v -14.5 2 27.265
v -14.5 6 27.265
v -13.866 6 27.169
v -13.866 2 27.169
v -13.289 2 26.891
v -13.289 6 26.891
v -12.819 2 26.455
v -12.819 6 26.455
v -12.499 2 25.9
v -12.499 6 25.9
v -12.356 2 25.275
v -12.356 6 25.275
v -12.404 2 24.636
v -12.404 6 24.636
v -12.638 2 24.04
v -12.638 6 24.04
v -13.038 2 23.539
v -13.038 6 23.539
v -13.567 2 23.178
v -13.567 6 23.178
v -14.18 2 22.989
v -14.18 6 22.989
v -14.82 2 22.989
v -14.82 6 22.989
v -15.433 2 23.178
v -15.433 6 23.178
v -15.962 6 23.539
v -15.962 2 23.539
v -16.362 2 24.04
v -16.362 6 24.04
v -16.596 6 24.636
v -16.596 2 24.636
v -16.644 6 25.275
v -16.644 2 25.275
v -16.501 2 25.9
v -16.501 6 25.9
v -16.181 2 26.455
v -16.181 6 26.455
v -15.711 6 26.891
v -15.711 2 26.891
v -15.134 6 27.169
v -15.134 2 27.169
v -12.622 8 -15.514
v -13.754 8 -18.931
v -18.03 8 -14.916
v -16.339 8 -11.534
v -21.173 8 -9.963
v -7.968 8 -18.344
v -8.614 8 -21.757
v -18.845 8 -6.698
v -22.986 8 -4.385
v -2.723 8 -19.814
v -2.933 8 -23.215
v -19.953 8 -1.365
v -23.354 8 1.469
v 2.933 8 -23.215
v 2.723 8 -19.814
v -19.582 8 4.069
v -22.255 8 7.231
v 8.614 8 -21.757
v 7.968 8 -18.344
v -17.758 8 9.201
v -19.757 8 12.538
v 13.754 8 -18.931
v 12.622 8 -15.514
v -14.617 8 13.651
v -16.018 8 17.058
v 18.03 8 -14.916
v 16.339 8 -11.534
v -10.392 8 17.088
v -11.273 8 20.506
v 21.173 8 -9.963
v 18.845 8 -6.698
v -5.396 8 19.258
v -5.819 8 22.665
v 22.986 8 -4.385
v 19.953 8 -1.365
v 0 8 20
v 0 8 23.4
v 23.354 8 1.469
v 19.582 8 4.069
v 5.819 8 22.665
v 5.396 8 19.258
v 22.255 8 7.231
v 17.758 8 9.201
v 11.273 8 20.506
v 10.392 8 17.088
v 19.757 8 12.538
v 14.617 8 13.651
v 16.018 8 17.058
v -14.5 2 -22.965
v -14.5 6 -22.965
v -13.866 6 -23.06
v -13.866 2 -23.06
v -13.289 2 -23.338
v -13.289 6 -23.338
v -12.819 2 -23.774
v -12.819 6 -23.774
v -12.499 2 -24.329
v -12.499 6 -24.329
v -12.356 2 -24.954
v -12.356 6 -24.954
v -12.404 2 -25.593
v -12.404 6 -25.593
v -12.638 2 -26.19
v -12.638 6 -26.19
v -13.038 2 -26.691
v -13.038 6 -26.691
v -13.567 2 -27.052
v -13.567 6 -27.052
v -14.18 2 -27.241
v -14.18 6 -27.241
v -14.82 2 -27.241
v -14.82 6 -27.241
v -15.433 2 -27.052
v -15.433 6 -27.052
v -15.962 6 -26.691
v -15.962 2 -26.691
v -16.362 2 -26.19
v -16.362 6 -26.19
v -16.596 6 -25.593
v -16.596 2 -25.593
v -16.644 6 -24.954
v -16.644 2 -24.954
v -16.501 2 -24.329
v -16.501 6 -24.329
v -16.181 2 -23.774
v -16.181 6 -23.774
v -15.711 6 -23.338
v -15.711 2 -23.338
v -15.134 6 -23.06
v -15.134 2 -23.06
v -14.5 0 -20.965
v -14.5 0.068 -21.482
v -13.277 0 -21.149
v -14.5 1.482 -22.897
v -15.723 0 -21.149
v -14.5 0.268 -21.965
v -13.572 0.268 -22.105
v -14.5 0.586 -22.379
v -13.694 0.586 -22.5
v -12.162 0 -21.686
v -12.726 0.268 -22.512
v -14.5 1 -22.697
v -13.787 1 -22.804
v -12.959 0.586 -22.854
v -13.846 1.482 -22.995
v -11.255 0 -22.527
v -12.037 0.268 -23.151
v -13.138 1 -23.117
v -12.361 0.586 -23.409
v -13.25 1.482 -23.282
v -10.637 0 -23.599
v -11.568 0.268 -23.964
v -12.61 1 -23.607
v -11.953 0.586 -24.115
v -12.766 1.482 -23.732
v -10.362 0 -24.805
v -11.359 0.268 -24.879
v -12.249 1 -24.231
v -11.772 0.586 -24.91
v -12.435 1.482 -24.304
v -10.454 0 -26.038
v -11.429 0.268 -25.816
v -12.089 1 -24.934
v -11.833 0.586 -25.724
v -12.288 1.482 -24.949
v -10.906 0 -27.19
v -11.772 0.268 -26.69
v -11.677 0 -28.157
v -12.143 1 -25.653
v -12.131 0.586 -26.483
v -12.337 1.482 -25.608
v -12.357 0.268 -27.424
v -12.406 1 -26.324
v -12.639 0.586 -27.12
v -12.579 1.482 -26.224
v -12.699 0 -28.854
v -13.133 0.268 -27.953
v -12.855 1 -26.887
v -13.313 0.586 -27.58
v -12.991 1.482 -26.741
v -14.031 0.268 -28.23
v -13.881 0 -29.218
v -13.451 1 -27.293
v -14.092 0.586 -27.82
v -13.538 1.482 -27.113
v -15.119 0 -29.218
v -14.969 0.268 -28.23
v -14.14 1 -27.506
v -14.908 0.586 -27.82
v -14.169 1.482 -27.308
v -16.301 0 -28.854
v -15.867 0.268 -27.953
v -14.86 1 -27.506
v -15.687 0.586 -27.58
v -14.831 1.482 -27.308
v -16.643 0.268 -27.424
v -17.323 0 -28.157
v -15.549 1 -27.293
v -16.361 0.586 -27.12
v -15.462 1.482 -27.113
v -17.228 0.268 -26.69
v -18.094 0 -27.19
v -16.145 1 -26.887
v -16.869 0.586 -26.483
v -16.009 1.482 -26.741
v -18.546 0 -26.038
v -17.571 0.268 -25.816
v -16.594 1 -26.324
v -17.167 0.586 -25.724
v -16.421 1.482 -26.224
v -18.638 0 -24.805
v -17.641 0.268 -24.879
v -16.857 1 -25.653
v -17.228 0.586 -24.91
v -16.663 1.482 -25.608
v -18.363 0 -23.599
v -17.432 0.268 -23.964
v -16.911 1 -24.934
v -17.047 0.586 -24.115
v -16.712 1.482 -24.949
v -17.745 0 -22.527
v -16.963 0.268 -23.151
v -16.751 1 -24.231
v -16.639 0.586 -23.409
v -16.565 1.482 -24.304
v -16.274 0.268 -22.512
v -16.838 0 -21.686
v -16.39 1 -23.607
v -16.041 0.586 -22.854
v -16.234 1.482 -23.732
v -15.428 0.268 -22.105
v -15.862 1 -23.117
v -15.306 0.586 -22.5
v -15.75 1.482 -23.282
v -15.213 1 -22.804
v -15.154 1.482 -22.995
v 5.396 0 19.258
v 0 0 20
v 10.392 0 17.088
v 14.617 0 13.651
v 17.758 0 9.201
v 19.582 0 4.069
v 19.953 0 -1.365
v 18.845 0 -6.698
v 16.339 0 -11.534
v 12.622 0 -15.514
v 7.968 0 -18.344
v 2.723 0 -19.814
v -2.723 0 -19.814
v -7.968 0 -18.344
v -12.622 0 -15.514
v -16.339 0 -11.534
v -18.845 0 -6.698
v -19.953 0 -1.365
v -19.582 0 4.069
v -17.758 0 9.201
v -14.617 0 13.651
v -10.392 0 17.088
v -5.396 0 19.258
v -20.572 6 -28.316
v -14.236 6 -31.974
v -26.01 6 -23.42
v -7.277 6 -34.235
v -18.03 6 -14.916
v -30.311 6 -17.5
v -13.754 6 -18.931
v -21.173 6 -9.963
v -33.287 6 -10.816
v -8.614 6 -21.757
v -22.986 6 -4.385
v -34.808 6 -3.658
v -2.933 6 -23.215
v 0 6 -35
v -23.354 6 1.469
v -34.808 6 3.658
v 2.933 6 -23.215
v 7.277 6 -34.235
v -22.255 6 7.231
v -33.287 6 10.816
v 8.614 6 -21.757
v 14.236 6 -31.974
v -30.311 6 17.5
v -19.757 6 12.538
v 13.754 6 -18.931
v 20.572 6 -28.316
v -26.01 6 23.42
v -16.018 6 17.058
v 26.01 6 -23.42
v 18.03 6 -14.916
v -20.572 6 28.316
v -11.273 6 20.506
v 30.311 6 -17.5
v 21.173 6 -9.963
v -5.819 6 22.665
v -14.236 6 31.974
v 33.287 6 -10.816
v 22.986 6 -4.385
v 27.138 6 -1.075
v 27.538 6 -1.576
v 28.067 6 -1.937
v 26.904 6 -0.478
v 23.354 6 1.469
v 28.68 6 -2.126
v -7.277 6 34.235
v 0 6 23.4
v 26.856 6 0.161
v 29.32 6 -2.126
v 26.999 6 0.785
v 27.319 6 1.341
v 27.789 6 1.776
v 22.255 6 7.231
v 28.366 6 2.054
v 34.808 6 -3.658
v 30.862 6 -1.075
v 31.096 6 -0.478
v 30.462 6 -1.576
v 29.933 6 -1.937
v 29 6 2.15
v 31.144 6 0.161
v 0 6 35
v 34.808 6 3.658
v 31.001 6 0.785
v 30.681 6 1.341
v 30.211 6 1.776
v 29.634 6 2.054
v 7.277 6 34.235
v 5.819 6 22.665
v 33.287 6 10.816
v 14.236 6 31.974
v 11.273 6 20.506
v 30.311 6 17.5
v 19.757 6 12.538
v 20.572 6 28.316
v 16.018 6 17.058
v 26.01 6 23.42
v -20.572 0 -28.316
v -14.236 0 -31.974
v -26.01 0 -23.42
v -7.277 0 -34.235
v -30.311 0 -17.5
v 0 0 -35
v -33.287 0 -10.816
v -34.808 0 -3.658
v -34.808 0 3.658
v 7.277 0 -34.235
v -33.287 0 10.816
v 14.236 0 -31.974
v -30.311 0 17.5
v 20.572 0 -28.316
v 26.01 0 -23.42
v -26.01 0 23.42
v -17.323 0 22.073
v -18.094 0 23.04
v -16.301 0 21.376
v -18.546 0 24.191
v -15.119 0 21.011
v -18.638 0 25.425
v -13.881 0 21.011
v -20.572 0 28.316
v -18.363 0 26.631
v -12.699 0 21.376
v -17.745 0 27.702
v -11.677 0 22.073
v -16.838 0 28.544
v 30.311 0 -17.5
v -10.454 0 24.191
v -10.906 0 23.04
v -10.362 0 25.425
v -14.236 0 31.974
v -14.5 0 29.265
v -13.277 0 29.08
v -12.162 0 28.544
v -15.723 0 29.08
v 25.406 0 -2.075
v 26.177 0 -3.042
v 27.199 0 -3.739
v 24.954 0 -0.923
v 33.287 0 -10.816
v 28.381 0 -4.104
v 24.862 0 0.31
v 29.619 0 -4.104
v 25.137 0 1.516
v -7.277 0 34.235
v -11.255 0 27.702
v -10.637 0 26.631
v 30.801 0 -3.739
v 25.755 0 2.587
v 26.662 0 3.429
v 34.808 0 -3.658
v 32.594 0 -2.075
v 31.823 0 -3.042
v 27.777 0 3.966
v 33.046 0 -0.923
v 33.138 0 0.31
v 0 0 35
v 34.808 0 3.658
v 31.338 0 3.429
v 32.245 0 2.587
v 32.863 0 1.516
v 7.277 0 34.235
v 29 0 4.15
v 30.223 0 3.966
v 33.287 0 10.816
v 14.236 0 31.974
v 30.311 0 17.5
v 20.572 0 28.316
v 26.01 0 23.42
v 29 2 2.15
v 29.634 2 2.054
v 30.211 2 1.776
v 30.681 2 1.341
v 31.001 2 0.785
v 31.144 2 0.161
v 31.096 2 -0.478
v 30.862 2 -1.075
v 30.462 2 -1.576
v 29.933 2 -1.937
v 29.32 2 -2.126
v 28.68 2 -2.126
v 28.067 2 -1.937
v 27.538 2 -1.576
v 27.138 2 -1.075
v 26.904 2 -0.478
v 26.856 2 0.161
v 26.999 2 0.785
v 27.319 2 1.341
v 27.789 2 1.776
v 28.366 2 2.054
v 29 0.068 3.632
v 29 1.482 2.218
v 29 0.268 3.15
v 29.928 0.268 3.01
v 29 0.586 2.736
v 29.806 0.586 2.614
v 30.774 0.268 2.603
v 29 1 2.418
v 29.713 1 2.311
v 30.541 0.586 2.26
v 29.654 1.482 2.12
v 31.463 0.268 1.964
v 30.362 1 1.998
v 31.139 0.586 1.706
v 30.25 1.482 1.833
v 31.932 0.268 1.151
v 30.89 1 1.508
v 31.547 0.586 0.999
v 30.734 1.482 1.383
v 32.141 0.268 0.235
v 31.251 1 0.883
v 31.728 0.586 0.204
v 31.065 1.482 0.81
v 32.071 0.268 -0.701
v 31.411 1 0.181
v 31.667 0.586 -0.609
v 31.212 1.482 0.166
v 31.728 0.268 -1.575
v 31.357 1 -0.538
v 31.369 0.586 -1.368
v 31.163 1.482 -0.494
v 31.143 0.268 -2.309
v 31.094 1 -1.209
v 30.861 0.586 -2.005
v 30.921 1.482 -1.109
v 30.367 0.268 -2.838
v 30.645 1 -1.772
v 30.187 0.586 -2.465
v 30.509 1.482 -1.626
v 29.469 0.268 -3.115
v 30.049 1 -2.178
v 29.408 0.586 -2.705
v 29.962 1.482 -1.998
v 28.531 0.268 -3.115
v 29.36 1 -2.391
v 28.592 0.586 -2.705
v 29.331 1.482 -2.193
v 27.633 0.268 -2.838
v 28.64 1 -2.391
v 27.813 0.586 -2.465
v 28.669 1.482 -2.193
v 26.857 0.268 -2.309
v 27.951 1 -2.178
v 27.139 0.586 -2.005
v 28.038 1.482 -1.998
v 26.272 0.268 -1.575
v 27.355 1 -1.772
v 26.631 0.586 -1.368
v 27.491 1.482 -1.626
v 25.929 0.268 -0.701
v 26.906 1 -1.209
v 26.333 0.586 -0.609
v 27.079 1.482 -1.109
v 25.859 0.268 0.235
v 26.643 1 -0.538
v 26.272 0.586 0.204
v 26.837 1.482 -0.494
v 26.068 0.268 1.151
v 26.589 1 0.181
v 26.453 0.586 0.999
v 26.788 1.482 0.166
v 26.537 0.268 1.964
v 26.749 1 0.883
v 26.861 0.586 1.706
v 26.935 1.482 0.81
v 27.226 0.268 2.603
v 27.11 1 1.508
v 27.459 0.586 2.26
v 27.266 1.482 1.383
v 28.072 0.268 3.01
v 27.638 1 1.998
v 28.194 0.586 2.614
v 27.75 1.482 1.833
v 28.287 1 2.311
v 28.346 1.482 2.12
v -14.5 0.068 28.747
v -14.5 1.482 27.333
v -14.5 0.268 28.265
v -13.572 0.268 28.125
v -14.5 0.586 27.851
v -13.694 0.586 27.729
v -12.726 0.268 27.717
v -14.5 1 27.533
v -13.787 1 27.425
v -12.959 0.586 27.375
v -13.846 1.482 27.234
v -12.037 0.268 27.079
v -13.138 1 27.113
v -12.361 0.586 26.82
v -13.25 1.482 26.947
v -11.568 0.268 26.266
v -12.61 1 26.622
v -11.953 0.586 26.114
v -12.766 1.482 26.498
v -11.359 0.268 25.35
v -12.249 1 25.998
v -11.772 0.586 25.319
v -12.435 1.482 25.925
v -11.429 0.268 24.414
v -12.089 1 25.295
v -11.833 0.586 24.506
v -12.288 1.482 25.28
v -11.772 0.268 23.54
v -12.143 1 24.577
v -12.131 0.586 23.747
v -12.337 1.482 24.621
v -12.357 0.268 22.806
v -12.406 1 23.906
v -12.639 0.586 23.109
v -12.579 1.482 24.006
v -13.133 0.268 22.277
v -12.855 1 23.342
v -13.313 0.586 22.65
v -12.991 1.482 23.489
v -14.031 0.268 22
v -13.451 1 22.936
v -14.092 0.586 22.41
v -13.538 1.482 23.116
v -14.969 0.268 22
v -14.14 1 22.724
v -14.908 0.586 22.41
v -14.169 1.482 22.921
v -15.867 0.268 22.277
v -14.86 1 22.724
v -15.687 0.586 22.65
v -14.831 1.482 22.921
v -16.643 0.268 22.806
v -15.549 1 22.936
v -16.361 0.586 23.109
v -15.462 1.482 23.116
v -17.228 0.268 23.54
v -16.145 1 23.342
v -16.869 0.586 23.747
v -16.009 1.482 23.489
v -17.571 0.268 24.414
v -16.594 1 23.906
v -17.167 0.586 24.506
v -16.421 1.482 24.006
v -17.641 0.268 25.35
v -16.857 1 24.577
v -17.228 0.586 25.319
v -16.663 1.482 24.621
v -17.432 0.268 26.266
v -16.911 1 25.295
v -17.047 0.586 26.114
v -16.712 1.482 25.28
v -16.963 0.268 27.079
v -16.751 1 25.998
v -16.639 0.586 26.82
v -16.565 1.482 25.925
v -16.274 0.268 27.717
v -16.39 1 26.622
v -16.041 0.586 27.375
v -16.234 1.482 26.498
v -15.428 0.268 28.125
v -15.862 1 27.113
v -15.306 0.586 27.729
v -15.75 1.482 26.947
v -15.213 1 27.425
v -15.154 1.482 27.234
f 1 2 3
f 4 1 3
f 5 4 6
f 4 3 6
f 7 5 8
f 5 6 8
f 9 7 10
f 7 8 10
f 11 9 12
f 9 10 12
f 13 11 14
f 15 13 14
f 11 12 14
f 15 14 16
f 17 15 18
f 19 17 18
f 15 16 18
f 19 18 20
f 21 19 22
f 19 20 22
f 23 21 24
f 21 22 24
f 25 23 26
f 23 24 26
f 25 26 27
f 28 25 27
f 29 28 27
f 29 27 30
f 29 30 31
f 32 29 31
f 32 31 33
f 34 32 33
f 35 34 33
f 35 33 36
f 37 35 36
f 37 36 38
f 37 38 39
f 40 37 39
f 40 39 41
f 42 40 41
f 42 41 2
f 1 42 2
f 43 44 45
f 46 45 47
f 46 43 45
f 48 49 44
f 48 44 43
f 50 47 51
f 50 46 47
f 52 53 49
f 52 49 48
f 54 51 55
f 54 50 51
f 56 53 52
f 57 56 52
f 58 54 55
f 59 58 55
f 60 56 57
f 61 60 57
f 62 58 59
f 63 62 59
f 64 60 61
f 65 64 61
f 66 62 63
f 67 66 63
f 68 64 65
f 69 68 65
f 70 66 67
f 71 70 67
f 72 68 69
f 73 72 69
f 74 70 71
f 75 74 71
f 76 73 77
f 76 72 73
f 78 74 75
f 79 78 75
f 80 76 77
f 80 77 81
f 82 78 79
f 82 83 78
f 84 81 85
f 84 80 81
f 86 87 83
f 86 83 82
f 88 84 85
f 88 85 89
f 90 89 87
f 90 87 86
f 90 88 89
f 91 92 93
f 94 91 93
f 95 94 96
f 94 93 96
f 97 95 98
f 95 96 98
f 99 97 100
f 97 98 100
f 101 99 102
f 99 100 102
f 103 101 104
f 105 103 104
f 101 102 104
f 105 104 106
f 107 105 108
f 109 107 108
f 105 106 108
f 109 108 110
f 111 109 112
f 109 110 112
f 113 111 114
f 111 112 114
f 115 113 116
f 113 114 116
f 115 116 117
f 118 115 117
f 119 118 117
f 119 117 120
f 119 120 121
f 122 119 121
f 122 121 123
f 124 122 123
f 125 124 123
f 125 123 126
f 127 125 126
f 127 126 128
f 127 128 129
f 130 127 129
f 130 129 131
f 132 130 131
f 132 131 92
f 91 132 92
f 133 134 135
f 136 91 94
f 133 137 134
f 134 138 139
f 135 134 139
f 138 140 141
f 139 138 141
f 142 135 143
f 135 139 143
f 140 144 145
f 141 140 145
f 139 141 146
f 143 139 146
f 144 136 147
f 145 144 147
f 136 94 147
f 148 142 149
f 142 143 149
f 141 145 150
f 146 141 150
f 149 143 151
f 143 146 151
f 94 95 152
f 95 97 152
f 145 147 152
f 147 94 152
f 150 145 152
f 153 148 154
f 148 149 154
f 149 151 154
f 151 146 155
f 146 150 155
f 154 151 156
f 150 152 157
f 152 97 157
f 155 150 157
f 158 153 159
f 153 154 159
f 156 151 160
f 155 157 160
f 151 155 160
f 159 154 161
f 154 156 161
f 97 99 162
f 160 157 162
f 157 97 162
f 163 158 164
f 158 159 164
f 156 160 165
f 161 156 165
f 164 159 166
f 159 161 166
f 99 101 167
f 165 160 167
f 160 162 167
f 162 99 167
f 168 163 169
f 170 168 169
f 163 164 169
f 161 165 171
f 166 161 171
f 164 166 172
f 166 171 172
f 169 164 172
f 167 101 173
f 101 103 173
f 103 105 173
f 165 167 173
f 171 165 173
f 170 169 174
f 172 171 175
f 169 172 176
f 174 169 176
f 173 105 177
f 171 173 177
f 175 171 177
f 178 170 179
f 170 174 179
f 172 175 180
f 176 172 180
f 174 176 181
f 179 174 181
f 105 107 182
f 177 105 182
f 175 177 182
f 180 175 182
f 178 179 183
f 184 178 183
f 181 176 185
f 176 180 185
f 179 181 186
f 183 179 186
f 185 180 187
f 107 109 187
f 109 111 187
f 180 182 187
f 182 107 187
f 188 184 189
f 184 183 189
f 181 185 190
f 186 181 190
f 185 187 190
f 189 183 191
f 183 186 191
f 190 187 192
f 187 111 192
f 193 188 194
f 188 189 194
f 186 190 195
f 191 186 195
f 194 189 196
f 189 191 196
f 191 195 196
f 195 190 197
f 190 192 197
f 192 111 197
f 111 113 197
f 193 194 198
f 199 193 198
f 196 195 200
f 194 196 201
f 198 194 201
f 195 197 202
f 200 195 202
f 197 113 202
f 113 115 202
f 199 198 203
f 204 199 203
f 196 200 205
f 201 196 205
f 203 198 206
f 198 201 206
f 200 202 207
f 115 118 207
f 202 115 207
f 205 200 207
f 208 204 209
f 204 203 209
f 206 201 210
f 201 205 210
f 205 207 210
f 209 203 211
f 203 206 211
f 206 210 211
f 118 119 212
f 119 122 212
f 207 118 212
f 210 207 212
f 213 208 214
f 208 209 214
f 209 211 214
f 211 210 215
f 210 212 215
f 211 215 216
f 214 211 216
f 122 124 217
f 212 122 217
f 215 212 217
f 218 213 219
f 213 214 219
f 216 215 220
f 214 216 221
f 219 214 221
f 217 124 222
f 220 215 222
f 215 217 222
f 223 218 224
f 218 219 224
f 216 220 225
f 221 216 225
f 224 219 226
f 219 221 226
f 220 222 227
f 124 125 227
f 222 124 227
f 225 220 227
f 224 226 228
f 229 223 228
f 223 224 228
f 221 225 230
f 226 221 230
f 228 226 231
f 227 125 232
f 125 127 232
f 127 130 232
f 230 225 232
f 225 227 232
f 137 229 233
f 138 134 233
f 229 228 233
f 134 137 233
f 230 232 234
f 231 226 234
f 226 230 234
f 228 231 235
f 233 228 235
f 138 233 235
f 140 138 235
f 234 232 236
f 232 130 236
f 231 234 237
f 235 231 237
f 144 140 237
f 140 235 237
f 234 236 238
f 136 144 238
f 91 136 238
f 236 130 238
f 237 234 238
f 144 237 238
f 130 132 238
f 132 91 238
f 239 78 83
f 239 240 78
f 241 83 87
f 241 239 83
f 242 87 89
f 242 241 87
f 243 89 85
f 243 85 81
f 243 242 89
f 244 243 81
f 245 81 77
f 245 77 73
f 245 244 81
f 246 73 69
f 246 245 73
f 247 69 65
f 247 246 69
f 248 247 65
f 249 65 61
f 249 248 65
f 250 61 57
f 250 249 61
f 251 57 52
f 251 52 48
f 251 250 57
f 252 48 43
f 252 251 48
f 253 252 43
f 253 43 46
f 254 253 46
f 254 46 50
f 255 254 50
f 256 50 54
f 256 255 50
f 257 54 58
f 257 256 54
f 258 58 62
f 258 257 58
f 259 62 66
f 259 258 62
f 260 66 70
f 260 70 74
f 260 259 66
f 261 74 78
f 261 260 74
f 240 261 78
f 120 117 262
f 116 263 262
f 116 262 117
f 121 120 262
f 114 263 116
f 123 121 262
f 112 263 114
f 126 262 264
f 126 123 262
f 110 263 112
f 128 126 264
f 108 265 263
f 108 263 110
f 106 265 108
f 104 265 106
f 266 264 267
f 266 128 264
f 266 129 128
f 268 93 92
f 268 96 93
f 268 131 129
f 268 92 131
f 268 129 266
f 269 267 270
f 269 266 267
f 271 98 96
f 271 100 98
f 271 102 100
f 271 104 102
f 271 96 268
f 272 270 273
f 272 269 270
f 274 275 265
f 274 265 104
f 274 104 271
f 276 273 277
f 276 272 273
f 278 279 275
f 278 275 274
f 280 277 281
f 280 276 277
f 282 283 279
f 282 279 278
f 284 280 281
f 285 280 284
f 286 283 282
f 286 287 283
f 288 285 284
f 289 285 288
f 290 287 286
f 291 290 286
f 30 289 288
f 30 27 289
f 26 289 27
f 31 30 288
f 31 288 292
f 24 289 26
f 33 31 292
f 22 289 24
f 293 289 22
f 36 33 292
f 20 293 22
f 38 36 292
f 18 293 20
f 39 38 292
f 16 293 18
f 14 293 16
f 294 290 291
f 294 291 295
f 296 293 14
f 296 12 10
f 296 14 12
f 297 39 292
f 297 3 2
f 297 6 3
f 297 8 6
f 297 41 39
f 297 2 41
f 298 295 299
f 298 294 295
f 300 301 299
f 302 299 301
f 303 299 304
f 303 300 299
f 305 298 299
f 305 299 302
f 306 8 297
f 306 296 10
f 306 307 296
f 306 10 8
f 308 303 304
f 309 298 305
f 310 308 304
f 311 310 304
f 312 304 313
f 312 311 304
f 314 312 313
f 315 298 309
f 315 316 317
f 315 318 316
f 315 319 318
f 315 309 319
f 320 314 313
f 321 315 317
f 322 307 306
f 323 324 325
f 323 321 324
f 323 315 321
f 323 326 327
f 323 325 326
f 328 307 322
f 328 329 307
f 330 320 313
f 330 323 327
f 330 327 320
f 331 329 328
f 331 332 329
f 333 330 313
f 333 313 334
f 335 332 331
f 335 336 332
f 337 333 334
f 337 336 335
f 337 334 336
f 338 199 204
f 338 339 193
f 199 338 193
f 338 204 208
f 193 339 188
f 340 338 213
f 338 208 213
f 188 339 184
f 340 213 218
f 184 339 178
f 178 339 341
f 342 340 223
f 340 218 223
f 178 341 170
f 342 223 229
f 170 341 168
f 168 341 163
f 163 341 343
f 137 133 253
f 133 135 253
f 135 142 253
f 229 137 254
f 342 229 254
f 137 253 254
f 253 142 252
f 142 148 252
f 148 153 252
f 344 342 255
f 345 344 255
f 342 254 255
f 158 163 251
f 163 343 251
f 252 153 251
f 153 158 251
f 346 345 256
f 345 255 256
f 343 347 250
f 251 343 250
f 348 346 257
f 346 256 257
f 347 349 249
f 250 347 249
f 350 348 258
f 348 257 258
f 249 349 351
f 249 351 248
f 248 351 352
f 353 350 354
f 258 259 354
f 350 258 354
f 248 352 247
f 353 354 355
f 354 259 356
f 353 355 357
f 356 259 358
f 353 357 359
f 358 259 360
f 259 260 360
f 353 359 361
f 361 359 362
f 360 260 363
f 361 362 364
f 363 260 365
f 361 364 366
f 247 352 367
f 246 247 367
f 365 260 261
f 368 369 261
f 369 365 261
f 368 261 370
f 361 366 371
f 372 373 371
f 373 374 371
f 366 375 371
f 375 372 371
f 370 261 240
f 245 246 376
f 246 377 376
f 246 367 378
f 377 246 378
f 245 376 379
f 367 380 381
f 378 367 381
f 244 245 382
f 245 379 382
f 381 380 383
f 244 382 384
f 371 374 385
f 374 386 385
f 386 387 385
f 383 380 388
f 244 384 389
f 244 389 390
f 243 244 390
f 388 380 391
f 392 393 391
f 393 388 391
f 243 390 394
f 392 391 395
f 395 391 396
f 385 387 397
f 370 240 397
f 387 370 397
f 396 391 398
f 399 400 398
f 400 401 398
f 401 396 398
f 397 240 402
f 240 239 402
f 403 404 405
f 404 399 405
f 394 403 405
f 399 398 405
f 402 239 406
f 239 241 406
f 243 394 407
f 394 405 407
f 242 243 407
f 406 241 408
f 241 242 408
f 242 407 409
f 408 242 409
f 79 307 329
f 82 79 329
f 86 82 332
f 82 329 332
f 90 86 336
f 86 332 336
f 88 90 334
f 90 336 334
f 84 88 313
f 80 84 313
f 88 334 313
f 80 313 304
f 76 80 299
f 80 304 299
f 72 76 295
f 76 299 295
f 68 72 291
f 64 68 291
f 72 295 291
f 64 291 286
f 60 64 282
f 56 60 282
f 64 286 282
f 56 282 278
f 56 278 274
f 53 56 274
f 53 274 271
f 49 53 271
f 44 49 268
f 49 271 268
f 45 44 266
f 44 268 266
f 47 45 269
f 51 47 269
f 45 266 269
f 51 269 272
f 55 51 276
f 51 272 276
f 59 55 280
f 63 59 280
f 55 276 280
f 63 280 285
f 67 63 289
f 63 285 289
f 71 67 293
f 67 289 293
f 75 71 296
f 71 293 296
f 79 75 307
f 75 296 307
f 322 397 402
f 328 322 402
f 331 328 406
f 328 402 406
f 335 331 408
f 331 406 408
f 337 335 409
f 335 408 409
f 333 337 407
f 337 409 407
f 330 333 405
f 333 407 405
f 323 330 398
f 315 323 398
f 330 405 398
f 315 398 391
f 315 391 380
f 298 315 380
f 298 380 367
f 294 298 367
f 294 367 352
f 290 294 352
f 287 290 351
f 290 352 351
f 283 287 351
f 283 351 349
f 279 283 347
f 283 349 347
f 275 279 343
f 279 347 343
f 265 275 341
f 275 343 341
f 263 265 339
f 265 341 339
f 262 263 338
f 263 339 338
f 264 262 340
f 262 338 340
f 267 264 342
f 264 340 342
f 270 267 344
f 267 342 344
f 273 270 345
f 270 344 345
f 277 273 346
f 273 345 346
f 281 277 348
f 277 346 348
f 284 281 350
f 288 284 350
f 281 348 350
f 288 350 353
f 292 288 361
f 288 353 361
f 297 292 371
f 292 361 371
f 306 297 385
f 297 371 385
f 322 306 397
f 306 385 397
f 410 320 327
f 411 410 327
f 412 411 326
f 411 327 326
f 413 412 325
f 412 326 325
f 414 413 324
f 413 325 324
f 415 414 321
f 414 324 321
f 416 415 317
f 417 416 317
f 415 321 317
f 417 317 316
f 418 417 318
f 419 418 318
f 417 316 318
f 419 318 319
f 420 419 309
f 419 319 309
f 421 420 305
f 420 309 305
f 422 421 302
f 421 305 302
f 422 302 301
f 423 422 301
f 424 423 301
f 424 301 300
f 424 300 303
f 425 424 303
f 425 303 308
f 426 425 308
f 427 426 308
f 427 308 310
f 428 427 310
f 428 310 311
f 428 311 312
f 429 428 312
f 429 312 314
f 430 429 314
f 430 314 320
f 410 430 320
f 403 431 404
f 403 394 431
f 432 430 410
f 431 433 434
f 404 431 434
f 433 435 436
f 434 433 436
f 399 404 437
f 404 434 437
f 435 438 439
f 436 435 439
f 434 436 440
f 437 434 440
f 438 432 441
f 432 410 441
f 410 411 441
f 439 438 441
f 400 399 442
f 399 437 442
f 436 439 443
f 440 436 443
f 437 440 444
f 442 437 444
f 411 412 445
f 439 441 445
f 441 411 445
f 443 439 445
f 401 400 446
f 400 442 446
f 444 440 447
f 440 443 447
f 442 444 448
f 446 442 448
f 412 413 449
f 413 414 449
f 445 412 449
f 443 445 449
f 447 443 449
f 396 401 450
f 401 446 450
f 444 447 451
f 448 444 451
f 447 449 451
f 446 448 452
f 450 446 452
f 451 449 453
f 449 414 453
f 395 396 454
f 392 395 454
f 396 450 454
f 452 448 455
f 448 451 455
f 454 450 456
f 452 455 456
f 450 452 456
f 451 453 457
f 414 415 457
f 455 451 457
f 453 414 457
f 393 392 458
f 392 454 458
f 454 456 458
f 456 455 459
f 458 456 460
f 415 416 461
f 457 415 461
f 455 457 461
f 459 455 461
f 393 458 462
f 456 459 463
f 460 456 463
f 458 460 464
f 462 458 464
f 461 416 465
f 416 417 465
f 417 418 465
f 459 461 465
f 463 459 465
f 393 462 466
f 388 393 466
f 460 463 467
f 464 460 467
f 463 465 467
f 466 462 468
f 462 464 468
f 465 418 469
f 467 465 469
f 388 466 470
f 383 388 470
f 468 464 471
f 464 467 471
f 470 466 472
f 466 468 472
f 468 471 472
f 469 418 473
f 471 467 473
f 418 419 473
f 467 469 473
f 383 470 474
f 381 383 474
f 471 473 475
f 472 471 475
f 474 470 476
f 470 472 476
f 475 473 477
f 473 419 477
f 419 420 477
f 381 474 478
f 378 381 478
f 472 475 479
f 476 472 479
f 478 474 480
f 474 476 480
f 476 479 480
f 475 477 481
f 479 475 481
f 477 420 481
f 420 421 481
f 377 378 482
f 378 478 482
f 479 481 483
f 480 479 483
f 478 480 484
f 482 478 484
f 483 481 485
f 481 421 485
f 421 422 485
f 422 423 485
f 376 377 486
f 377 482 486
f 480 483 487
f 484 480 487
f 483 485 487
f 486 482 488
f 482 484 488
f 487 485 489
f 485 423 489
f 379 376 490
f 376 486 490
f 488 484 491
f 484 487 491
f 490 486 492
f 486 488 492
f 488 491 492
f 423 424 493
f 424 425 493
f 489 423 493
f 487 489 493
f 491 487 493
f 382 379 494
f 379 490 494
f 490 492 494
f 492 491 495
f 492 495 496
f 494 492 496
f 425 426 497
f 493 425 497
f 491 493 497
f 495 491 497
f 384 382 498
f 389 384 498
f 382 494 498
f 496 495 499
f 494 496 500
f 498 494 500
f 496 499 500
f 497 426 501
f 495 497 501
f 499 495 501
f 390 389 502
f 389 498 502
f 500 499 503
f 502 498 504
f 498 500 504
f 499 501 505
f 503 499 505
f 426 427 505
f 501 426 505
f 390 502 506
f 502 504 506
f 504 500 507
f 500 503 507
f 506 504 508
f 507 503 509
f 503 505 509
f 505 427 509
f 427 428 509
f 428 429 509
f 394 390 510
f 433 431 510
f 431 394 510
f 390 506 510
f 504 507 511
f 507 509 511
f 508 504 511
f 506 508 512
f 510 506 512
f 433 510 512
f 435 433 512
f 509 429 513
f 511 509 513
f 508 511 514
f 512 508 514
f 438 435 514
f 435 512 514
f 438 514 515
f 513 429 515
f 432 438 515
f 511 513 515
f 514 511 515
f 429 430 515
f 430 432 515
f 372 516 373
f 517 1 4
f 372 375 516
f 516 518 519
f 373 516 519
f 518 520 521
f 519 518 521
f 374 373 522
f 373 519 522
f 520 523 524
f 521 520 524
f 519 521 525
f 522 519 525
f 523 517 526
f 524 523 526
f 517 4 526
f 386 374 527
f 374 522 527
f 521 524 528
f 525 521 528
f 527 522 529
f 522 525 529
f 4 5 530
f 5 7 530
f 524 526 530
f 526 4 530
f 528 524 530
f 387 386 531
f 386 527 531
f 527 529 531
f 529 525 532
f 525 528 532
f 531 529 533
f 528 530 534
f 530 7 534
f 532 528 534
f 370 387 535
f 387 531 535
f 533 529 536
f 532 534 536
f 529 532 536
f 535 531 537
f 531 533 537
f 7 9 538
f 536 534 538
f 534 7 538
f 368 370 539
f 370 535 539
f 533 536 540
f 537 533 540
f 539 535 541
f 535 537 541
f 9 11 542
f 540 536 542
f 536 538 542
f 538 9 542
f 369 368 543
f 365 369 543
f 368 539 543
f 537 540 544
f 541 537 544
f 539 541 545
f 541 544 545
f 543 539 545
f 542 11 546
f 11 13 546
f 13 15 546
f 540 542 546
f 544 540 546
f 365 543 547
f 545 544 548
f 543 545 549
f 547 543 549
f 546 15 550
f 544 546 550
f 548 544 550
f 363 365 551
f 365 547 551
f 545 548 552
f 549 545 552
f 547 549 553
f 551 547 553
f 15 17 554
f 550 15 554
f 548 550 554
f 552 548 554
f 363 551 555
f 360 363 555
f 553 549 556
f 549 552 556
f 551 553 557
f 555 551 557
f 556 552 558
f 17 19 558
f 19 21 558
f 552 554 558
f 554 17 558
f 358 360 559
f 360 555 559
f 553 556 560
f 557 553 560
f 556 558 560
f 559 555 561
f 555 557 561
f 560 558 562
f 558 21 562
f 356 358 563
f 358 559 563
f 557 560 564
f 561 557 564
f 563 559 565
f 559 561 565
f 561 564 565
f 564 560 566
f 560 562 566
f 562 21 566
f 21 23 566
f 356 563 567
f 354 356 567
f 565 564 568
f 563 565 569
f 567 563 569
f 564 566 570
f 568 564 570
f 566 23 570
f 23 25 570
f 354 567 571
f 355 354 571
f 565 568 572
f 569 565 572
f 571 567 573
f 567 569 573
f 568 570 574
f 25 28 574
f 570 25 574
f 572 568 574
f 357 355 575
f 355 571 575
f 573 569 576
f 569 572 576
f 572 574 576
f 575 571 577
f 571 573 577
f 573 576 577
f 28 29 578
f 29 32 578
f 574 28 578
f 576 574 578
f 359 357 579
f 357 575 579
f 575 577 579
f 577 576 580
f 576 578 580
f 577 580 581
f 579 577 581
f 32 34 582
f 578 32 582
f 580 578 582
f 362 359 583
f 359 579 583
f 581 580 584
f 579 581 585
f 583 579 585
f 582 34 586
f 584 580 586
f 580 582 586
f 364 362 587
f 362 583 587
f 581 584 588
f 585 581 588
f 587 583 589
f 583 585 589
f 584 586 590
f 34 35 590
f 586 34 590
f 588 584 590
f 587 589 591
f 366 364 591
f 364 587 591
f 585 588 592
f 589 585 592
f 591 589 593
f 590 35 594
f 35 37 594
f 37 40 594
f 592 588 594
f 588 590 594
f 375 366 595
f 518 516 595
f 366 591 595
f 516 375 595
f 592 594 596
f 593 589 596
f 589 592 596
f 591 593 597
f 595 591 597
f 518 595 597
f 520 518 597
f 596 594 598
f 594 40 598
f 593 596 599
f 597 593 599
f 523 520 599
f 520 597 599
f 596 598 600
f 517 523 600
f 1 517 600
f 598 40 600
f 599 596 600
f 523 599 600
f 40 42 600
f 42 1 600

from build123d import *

# Parameters (mm, degrees)
SKETCH_1_R          = 35
SKETCH_1_R_2        = 20
EXTRUDE_1_DEPTH     = 6
SKETCH_2_R          = 2.15
CUT_EXTRUDE_1_DEPTH = 70
FILLET_2_R          = 2
SKETCH_3_R          = 23.4
SKETCH_3_R_2        = 20
EXTRUDE_2_DEPTH     = 2


with BuildPart() as part:
    # 草图1 → 凸台-拉伸1 (new body)
    with BuildSketch(Plane(origin=(0, 0, 0), x_dir=(1, 0, 0), z_dir=(0, 1, 0))):
        with Locations(Location((0, 0, 0), (0, 0, 270))):
            Circle(SKETCH_1_R)
        with Locations(Location((0, 0, 0), (0, 0, 270))):
            Circle(SKETCH_1_R_2, mode=Mode.SUBTRACT)
    extrude(amount=EXTRUDE_1_DEPTH)

    # 草图2 → 切除-拉伸1 (cut)
    with BuildSketch(Plane(origin=(0, 6, 0), x_dir=(1, 0, 0), z_dir=(0, 1, 0))):
        with Locations(Location((29, 0, 0), (0, 0, 270))):
            Circle(SKETCH_2_R)
        with Locations(Location((-14.5, -25.11473671, 0), (0, 0, 270))):
            Circle(SKETCH_2_R)
        with Locations(Location((-14.5, 25.11473671, 0), (0, 0, 270))):
            Circle(SKETCH_2_R)
    extrude(amount=-CUT_EXTRUDE_1_DEPTH, mode=Mode.SUBTRACT)

    # 圆角2
    fillet_2_edges = [part.edges().sort_by_distance(p)[0] for p in [
        (29, 0, -2.15),
        (-14.5, 0, 22.96473671),
        (-14.5, 0, -27.26473671),
    ]]
    fillet(fillet_2_edges, radius=FILLET_2_R)

    # 草图3 → 凸台-拉伸2 (add)
    with BuildSketch(Plane(origin=(0, 6, 0), x_dir=(1, 0, 0), z_dir=(0, 1, 0))):
        with Locations(Location((0, 0, 0), (0, 0, 270))):
            Circle(SKETCH_3_R)
        with Locations(Location((0, 0, 0), (0, 0, 270))):
            Circle(SKETCH_3_R_2, mode=Mode.SUBTRACT)
    extrude(amount=EXTRUDE_2_DEPTH)


solid = part.part
